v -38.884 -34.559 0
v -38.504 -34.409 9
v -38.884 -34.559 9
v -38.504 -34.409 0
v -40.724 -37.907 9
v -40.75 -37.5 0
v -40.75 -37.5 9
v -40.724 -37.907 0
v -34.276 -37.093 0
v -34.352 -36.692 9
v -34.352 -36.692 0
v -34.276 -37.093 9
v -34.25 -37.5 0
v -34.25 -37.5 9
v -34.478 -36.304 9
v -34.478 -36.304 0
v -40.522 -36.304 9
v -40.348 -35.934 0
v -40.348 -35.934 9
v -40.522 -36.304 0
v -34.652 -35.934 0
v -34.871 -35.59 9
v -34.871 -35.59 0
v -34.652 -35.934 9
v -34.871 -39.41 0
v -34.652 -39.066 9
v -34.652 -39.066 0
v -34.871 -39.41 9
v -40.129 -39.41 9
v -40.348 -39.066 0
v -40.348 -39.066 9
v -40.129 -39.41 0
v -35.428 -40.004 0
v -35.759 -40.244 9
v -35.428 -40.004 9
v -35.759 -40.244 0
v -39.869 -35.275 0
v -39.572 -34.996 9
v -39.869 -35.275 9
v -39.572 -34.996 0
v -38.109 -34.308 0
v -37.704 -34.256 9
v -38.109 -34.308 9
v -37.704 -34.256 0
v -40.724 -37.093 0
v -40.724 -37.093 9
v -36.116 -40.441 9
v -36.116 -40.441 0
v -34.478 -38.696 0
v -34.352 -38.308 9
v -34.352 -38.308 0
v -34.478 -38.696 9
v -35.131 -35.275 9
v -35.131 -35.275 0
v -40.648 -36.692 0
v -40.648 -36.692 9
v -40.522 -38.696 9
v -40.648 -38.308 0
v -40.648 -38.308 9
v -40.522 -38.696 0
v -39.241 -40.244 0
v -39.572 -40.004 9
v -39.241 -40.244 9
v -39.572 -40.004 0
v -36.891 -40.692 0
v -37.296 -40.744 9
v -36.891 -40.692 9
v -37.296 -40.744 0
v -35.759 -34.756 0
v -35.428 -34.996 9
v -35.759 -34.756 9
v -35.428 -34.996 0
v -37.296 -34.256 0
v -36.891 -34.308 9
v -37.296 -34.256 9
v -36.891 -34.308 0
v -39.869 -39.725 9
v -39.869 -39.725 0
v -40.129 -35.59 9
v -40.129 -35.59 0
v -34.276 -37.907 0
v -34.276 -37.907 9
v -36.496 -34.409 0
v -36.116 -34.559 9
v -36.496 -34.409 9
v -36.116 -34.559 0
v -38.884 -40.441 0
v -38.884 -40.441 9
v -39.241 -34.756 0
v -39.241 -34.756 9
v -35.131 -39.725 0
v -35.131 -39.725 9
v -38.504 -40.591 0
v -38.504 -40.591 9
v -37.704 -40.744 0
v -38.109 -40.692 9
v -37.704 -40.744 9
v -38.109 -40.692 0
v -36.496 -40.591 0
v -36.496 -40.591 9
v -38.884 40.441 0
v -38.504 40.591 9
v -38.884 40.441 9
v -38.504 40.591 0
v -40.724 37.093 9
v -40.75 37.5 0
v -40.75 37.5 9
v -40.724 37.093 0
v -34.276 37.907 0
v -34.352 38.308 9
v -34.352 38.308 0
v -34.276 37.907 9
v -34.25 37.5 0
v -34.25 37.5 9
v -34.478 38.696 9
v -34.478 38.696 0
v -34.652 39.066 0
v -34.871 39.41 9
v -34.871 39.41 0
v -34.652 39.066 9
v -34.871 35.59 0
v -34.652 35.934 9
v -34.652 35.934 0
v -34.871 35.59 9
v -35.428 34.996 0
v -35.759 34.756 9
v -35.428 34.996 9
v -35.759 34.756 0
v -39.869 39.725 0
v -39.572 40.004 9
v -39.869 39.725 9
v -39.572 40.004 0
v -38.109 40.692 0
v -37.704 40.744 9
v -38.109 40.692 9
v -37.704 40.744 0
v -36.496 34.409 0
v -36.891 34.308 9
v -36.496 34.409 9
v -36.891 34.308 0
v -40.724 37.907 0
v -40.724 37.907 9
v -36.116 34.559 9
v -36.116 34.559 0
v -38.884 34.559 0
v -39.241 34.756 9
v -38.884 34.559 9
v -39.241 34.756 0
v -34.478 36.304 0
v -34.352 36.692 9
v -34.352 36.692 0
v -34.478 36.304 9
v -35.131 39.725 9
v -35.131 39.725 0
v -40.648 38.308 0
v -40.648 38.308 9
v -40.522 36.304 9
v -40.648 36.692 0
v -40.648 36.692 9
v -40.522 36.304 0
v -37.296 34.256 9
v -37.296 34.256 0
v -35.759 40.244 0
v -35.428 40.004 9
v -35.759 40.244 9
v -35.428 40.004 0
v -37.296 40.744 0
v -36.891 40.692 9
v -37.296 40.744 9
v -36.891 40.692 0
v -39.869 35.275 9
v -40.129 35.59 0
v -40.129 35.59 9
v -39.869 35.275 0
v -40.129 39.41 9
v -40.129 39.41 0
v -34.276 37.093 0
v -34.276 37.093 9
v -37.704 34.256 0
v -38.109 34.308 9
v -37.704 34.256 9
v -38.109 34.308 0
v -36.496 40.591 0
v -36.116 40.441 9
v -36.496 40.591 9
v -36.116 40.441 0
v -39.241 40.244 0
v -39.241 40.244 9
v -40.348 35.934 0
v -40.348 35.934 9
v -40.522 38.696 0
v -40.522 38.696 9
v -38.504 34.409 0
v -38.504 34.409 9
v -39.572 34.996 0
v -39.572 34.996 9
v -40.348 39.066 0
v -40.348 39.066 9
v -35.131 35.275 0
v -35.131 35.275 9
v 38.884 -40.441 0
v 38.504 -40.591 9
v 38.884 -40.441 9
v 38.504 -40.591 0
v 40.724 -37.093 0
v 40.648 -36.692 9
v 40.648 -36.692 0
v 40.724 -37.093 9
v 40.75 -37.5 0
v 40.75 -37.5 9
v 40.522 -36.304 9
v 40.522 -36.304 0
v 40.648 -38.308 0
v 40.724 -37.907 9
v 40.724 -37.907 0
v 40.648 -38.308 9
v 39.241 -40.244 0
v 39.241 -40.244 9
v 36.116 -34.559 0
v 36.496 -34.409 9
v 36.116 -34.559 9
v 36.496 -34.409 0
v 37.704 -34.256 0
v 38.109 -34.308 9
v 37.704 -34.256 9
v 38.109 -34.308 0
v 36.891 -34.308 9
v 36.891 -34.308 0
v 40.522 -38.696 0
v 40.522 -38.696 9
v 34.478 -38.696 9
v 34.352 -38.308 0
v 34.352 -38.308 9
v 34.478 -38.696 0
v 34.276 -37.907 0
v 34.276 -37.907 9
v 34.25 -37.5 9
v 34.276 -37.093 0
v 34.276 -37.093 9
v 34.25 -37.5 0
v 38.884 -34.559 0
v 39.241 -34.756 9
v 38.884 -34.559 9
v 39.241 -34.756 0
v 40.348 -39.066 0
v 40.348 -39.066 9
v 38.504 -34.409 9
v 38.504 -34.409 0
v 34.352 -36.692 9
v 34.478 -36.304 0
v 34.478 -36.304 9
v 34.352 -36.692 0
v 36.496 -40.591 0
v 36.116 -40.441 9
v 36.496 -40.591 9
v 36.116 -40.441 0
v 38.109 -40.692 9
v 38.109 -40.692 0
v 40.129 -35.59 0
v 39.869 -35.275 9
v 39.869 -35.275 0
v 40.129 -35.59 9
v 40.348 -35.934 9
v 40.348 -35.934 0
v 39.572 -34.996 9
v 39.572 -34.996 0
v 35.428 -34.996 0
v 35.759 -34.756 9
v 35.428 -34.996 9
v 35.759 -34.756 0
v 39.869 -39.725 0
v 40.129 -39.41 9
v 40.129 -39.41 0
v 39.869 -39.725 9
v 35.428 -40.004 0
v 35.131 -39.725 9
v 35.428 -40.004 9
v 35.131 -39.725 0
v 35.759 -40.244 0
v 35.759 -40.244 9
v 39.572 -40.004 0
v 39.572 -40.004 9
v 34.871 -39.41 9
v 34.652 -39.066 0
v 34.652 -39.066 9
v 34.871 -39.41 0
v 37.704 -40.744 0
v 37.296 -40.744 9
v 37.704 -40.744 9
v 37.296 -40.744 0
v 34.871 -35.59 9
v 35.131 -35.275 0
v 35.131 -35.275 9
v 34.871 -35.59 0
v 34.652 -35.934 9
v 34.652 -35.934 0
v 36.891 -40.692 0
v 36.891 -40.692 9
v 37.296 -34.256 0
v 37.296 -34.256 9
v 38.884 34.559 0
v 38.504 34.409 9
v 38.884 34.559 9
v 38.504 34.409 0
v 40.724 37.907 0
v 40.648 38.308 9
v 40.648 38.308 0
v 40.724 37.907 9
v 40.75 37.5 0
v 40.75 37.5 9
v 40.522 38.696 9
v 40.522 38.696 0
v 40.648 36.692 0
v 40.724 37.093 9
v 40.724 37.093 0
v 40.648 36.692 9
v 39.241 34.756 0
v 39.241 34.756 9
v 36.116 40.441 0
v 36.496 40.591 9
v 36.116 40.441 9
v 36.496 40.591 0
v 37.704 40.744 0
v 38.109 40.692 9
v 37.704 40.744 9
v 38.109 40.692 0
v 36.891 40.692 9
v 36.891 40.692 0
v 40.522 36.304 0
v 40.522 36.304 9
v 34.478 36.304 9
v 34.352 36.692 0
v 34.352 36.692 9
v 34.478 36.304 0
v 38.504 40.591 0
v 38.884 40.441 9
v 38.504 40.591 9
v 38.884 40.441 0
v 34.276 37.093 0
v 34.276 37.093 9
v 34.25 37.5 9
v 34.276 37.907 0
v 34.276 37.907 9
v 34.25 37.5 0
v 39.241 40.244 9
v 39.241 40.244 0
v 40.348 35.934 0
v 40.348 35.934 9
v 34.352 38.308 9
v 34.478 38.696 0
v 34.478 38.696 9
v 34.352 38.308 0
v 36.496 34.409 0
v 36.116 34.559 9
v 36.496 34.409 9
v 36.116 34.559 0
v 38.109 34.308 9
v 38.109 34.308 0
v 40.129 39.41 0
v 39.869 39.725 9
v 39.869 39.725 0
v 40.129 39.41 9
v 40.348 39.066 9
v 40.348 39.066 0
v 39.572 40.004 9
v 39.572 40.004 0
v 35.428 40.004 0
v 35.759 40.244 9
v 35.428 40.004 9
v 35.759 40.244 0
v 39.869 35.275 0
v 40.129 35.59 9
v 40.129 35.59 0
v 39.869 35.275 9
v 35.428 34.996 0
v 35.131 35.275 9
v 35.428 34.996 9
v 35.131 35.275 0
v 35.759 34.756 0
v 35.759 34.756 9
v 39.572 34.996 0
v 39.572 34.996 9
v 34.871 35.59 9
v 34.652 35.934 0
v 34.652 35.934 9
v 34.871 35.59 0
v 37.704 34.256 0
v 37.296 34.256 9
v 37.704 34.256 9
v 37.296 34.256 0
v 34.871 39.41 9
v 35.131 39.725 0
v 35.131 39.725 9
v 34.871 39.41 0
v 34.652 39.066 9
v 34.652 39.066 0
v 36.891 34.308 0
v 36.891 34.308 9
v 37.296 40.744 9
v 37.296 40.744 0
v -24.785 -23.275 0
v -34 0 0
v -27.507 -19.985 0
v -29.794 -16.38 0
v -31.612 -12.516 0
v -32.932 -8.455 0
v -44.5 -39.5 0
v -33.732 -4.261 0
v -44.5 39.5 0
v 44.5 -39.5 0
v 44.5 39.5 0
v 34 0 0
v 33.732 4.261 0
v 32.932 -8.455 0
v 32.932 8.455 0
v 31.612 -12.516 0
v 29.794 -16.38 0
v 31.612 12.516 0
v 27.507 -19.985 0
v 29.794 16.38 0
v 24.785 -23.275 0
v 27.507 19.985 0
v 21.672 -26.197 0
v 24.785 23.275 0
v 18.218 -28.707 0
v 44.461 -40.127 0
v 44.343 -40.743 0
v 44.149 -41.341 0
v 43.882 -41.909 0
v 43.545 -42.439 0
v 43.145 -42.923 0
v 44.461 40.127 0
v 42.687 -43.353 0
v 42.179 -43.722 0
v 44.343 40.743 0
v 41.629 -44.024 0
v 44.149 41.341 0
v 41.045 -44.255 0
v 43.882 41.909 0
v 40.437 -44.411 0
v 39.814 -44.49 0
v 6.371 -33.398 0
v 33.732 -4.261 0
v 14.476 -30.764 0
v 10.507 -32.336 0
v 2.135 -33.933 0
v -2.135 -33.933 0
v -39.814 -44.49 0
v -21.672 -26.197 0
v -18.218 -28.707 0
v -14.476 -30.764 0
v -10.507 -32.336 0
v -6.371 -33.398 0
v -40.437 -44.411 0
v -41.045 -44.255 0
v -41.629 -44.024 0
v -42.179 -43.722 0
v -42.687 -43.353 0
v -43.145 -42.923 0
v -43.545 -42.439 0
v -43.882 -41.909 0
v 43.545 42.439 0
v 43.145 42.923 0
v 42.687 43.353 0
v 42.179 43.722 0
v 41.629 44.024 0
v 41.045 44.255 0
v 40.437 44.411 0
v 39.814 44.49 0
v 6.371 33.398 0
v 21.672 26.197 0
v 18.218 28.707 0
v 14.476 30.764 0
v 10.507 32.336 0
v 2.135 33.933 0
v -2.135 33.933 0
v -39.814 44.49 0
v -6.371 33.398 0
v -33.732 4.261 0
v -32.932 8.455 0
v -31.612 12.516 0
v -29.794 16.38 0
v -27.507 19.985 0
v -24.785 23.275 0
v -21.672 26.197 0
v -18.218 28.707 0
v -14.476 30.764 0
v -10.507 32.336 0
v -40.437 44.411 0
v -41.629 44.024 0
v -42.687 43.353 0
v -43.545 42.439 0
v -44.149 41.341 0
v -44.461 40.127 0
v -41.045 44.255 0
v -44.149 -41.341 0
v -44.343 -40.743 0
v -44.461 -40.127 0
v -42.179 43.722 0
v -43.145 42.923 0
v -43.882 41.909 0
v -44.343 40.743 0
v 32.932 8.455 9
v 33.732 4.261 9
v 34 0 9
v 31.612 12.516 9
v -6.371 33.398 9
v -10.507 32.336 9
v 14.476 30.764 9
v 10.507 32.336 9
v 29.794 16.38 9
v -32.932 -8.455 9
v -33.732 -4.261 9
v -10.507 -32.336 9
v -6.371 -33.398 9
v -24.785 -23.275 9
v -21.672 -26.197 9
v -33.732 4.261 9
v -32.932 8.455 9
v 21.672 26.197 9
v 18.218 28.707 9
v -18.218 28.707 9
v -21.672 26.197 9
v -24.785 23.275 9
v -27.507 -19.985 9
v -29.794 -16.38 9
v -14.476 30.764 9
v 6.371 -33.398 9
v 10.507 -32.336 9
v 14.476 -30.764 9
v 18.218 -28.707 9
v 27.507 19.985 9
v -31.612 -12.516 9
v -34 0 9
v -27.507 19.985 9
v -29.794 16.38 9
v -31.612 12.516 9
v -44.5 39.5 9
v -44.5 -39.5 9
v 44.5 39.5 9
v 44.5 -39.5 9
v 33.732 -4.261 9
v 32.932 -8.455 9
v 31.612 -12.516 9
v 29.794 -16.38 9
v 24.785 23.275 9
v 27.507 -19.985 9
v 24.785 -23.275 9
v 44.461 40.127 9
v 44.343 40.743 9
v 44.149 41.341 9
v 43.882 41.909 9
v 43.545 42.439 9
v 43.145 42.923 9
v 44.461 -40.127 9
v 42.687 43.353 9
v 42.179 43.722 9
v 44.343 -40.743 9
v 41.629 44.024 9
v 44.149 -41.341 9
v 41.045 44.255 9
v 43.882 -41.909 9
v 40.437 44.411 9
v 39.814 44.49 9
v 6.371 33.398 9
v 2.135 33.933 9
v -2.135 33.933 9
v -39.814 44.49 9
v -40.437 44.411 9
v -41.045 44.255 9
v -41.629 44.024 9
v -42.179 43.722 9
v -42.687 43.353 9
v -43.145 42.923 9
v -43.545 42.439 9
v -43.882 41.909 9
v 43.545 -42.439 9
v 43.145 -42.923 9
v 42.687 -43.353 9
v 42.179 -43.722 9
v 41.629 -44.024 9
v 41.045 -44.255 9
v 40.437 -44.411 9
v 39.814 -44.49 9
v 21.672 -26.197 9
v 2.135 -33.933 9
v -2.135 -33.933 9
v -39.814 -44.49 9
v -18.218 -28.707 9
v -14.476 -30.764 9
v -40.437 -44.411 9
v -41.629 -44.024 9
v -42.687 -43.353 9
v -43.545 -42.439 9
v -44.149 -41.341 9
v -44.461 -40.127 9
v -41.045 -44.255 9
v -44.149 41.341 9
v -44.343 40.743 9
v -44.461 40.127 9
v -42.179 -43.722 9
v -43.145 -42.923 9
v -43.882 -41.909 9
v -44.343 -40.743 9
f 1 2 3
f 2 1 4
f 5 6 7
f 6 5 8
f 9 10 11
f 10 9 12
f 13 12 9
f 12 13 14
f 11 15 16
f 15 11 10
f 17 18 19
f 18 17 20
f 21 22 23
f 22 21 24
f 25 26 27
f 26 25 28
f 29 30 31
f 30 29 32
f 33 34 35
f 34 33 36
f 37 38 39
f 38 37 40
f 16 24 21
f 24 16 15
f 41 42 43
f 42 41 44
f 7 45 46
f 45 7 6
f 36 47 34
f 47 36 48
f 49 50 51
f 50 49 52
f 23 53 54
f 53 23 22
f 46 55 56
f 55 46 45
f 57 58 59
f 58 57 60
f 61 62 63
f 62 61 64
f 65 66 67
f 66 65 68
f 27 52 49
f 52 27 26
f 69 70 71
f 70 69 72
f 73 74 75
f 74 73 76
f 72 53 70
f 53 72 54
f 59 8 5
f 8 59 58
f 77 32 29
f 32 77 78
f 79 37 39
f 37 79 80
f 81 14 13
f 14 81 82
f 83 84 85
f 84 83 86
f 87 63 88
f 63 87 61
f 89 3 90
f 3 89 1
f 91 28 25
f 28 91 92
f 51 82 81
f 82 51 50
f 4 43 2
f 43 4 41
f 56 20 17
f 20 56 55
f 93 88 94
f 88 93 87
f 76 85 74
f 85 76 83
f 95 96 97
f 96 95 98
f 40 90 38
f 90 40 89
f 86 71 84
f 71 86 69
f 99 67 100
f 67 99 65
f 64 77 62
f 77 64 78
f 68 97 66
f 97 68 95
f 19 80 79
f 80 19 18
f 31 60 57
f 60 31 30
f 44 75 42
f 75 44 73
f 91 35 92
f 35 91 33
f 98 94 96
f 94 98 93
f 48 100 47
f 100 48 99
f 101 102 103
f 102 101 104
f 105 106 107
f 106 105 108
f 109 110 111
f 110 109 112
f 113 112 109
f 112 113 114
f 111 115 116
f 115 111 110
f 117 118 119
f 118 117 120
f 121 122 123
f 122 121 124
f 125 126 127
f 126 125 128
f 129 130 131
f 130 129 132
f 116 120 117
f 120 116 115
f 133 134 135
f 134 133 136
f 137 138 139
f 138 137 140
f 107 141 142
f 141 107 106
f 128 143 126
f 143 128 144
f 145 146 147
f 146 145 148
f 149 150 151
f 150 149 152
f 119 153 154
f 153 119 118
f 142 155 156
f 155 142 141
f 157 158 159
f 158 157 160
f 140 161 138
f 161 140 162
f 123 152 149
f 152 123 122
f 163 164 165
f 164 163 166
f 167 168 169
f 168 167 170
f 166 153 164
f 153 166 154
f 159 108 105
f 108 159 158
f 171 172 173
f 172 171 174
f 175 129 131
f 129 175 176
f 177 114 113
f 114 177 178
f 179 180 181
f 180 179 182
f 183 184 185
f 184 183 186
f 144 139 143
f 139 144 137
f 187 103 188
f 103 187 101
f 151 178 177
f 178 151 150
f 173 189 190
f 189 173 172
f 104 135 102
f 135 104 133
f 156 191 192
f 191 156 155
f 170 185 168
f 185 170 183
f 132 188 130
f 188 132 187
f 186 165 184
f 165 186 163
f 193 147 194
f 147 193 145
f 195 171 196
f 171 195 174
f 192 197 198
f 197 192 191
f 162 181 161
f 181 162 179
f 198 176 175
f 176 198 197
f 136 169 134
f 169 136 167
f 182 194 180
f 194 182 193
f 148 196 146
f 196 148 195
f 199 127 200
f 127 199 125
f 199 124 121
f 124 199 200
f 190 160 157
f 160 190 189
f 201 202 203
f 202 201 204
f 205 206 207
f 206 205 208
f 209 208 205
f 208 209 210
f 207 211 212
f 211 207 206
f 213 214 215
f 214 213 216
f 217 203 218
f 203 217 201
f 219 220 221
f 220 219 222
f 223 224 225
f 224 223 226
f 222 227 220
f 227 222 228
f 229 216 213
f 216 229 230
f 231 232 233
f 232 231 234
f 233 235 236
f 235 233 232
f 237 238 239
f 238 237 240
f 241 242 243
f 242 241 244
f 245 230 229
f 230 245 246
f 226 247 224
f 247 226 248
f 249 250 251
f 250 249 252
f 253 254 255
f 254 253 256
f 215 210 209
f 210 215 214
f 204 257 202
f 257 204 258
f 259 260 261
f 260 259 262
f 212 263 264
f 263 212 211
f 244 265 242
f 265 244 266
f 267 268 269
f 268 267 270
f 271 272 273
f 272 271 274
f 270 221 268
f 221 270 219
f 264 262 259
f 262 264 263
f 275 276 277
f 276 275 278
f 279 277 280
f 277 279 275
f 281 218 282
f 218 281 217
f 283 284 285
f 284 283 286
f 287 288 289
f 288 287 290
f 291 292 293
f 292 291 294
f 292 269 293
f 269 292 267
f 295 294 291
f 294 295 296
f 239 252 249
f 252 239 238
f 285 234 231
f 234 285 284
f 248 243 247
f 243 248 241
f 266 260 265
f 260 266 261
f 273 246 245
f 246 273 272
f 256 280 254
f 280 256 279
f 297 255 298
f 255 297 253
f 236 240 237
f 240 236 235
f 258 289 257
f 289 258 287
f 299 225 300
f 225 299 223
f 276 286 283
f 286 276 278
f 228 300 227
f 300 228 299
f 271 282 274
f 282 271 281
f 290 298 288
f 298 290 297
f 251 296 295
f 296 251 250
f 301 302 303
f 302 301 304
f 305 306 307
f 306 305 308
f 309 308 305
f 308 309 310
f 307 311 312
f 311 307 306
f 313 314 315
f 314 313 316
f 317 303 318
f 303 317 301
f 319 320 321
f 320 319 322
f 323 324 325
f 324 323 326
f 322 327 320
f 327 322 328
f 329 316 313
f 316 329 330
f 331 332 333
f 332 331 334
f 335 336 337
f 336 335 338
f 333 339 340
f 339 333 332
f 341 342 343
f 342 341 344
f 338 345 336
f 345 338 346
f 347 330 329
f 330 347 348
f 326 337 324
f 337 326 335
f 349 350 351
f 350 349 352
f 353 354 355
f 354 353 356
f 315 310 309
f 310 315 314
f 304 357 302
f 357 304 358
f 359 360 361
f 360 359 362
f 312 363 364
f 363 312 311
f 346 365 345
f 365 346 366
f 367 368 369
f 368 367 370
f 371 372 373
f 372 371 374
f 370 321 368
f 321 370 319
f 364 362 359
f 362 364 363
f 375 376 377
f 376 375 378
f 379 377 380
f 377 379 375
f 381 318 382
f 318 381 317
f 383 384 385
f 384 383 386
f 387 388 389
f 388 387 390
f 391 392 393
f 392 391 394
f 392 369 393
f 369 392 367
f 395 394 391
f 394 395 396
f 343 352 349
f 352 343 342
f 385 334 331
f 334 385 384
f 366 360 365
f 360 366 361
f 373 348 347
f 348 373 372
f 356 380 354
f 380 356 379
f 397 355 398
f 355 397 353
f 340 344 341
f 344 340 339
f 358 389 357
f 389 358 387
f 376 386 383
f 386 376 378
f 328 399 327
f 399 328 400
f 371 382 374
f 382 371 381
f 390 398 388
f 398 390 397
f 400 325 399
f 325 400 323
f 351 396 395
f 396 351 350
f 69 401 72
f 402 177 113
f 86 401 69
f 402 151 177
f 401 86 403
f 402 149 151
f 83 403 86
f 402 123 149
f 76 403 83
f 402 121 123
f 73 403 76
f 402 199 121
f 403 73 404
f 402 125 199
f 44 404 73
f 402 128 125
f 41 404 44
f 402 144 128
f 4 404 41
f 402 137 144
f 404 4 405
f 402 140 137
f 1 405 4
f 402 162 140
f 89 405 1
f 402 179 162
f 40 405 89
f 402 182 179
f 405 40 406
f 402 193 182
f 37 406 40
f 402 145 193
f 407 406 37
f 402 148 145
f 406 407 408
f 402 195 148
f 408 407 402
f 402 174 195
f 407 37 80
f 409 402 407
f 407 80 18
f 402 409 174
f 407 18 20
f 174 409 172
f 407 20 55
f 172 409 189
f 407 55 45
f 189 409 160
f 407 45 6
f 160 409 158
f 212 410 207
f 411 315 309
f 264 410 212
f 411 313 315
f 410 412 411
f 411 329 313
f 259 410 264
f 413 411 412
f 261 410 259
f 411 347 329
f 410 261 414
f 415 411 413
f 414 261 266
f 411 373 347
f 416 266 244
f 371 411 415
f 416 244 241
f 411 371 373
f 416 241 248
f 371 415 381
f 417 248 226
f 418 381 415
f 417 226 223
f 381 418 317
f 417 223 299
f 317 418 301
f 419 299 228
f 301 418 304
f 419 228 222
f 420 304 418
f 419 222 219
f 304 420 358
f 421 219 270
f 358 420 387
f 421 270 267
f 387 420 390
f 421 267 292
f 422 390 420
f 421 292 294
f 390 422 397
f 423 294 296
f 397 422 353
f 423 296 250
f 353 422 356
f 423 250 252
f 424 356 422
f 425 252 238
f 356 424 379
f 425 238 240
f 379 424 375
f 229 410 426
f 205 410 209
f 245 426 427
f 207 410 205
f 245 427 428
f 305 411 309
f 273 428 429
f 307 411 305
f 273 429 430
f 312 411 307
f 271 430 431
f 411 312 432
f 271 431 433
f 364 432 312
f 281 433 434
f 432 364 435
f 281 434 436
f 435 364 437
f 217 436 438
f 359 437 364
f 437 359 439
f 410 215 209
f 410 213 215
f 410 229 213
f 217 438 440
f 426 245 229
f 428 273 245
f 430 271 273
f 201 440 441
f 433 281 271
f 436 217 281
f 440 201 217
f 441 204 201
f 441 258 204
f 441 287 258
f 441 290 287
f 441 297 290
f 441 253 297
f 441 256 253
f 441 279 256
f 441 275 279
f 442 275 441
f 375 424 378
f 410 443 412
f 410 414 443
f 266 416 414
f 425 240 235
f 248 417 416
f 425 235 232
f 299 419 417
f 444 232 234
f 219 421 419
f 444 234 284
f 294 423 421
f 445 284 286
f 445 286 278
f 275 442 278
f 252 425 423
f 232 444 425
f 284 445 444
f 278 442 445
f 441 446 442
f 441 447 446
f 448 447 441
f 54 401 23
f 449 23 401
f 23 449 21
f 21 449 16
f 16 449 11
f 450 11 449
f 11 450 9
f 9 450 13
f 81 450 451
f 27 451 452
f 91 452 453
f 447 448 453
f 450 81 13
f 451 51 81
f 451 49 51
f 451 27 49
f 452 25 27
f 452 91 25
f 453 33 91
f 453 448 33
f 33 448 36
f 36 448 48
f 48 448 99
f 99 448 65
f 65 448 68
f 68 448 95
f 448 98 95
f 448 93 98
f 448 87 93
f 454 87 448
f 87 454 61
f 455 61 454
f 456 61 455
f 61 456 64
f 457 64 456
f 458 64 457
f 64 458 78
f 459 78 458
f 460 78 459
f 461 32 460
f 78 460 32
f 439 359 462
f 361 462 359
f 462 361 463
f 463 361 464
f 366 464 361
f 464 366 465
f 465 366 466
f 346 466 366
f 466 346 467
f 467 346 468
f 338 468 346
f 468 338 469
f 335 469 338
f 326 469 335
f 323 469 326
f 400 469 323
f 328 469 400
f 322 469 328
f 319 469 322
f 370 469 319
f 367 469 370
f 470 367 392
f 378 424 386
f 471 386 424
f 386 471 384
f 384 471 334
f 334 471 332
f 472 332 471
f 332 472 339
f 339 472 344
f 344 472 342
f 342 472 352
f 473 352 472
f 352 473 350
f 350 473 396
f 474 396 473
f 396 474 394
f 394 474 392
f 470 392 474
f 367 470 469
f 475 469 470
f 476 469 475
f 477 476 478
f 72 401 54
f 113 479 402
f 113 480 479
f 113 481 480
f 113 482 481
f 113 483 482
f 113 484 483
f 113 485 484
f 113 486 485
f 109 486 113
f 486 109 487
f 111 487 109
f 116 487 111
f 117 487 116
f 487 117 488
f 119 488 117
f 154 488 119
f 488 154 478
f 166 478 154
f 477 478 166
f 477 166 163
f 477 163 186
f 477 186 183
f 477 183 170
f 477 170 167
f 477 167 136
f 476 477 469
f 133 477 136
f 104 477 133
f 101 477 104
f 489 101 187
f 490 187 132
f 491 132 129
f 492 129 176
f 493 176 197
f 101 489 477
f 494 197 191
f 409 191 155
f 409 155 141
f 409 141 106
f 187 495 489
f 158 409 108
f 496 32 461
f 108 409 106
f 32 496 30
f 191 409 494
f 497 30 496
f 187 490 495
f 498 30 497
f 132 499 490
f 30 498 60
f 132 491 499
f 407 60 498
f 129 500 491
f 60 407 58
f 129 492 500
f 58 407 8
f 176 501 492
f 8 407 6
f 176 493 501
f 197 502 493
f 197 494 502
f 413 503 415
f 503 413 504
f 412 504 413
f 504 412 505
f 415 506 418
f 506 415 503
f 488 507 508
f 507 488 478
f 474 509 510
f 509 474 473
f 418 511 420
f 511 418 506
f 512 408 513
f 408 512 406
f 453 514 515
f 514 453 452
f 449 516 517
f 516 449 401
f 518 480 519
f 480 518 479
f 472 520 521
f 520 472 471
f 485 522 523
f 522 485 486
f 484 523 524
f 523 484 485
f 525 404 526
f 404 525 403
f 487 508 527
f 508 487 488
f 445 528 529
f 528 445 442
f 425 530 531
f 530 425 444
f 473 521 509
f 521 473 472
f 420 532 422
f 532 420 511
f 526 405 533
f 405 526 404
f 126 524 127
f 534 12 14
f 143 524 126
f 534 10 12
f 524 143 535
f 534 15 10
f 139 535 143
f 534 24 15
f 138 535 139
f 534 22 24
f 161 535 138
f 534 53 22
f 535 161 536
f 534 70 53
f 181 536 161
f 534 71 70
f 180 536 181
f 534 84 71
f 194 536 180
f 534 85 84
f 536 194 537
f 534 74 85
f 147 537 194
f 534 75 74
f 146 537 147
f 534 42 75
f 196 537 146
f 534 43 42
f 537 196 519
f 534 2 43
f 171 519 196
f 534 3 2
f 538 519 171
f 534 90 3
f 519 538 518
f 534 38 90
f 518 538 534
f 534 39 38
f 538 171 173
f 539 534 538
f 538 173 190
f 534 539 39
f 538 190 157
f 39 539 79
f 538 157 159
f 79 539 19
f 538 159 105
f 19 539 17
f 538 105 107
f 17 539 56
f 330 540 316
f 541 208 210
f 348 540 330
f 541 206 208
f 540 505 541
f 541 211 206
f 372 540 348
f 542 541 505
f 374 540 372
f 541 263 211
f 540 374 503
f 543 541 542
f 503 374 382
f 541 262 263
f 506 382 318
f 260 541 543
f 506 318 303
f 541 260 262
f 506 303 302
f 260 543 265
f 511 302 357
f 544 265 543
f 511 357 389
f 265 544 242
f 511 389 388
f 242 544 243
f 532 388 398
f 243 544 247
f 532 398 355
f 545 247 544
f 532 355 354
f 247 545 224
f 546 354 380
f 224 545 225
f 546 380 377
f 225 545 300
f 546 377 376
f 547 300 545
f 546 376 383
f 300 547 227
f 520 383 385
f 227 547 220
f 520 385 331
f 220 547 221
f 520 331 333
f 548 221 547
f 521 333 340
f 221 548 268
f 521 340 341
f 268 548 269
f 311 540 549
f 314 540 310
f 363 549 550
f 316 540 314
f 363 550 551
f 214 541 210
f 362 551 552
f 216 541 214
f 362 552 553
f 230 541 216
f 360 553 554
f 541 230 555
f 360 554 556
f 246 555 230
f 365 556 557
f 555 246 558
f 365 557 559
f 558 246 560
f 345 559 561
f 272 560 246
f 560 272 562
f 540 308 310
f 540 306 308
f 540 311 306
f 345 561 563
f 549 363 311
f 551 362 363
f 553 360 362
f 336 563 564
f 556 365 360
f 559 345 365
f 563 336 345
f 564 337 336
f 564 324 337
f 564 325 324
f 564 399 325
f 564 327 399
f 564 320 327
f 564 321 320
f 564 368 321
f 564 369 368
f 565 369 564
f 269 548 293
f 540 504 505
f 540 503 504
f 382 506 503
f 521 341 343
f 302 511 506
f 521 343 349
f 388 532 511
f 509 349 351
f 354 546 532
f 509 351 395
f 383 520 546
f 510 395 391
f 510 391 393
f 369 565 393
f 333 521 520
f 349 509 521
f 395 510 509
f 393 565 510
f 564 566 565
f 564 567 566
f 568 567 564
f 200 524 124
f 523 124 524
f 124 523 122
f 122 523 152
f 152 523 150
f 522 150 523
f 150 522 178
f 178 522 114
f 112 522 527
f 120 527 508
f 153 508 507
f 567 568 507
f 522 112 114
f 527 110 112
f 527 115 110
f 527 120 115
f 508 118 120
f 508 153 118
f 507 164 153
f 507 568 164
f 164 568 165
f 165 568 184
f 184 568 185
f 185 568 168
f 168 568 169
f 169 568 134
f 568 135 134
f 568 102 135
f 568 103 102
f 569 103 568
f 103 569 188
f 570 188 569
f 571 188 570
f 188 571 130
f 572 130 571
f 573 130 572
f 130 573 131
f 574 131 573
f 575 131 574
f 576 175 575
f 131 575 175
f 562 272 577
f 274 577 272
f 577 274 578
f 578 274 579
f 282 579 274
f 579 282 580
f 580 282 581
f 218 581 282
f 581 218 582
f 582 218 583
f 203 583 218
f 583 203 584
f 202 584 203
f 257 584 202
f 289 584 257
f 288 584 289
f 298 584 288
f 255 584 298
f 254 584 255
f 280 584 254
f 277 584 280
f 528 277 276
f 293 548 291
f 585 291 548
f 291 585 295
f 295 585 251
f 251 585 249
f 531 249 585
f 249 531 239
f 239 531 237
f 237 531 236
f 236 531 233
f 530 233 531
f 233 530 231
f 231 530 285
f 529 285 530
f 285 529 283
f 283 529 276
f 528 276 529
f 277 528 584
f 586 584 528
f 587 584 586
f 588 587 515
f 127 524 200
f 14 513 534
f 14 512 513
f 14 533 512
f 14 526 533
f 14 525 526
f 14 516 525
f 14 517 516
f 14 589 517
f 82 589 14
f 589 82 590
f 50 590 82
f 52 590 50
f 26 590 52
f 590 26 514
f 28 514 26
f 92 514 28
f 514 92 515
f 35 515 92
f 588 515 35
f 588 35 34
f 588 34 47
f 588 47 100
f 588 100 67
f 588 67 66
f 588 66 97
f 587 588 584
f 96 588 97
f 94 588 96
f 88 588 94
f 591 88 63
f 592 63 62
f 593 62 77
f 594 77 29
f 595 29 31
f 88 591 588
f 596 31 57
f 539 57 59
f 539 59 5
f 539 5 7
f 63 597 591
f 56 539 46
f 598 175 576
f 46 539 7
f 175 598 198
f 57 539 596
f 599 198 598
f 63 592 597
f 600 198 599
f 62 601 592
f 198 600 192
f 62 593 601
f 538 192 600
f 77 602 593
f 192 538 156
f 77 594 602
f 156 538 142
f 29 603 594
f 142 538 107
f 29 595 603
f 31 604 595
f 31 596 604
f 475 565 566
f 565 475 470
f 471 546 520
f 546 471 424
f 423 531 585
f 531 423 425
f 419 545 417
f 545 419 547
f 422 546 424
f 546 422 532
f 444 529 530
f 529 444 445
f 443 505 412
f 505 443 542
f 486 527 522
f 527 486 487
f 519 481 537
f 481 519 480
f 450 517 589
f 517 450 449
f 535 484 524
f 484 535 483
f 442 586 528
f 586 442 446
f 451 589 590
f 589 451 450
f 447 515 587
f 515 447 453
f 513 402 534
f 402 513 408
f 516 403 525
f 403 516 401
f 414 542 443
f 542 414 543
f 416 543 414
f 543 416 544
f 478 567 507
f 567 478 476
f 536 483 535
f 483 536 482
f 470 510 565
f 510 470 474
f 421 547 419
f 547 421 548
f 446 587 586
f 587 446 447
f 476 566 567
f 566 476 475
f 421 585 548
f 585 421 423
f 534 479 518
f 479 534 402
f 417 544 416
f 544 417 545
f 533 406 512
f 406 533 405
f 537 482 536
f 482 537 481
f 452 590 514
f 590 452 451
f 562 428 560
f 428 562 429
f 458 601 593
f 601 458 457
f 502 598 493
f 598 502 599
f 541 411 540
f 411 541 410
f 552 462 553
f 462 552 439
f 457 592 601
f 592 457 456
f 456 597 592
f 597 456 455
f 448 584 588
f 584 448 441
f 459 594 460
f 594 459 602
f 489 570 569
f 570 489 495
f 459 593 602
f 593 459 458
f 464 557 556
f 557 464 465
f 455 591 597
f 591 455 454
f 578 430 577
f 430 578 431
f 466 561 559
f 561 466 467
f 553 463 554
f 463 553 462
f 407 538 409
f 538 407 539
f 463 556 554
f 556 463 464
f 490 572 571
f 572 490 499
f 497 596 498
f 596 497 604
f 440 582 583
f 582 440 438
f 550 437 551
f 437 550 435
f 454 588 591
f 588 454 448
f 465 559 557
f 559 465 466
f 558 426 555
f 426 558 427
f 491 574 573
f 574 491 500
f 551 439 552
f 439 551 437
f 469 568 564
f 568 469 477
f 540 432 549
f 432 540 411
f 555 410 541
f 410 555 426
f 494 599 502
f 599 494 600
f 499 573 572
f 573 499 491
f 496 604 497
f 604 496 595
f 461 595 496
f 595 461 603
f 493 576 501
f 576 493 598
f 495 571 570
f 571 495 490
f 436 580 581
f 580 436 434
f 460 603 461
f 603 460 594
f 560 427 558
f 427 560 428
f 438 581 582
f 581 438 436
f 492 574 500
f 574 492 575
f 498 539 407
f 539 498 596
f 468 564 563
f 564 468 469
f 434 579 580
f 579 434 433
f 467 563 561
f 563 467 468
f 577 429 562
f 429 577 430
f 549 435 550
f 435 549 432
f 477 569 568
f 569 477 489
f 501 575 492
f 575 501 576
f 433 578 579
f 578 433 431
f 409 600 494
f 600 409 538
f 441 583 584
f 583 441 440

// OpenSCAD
$fn = 50;


difference() {
	union() {
		hull() {
			translate(v = [-39.5000000000, 39.5000000000, 0]) {
				cylinder(h = 9, r = 5);
			}
			translate(v = [39.5000000000, 39.5000000000, 0]) {
				cylinder(h = 9, r = 5);
			}
			translate(v = [-39.5000000000, -39.5000000000, 0]) {
				cylinder(h = 9, r = 5);
			}
			translate(v = [39.5000000000, -39.5000000000, 0]) {
				cylinder(h = 9, r = 5);
			}
		}
	}
	union() {
		#translate(v = [-37.5000000000, -37.5000000000, -100.0000000000]) {
			cylinder(h = 200, r = 3.2500000000);
		}
		#translate(v = [-37.5000000000, 37.5000000000, -100.0000000000]) {
			cylinder(h = 200, r = 3.2500000000);
		}
		#translate(v = [37.5000000000, -37.5000000000, -100.0000000000]) {
			cylinder(h = 200, r = 3.2500000000);
		}
		#translate(v = [37.5000000000, 37.5000000000, -100.0000000000]) {
			cylinder(h = 200, r = 3.2500000000);
		}
		#cylinder(h = 9, r = 34.0000000000);
	}
}
